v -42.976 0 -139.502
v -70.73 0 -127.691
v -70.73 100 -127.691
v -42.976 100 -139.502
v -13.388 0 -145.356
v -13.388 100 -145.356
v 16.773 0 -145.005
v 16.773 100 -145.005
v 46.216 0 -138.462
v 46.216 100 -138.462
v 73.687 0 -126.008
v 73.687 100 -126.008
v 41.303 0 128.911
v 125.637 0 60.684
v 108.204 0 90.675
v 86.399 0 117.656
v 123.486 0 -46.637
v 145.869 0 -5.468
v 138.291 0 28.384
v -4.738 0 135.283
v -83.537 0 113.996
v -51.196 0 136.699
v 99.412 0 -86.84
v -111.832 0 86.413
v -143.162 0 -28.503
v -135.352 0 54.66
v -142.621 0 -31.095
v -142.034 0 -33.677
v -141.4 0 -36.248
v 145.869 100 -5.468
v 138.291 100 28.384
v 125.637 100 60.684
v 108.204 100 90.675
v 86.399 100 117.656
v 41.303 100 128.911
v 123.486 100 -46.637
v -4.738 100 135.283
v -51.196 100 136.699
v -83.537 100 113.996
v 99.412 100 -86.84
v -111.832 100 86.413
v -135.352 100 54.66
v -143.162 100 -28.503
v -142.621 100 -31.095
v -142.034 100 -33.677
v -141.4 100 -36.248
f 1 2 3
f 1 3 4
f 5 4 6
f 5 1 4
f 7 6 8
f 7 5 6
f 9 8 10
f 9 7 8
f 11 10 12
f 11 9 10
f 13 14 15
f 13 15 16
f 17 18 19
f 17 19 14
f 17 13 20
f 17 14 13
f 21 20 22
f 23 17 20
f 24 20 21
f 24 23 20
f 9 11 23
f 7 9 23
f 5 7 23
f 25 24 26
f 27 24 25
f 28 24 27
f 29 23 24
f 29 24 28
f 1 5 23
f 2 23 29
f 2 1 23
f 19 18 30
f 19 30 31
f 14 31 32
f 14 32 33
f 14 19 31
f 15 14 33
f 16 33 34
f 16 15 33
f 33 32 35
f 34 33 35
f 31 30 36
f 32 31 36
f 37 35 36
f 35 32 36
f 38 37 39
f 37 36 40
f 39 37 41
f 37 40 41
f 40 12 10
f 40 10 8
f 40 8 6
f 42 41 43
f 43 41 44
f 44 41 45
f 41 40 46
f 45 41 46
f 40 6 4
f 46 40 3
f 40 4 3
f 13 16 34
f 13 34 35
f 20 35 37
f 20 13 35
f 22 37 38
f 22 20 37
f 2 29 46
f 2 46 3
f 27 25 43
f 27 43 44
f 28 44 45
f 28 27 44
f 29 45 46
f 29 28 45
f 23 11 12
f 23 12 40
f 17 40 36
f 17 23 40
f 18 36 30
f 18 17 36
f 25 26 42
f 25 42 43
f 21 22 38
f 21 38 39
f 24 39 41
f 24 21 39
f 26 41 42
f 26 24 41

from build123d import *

# Parameters (mm, degrees)
BOSS_EXTRUDE1_DEPTH = 100


with BuildPart() as part:
    # Sketch1 → Boss-Extrude1 (new body)
    with BuildSketch(Plane(origin=(0, 0, 0), x_dir=(1, 0, 0), z_dir=(0, 1, 0))):
        with BuildLine():
            Line((-135.351509673, -54.659892728), (-143.16186287, 28.502913245))
            ThreePointArc((-143.16186287, 28.502913245), (-142.333418361, 32.387236089), (-141.399603301, 36.247582406))
            Line((-141.399603301, 36.247582406), (-70.729724798, 127.691194191))
            ThreePointArc((-70.729724798, 127.691194191), (1.701551679, 145.961775016), (73.687223064, 126.007651359))
            ThreePointArc((73.687223064, 126.007651359), (111.65776791, 66.863352087), (145.869241729, 5.468030837))
            ThreePointArc((145.869241729, 5.468030837), (125.636702297, -60.683640158), (86.399335375, -117.655811121))
            ThreePointArc((86.399335375, -117.655811121), (18.367849273, -132.71304327), (-51.195880989, -136.699366544))
            ThreePointArc((-51.195880989, -136.699366544), (-98.238828154, -100.772834831), (-135.351509673, -54.659892728))
        make_face()
    extrude(amount=BOSS_EXTRUDE1_DEPTH)


solid = part.part
